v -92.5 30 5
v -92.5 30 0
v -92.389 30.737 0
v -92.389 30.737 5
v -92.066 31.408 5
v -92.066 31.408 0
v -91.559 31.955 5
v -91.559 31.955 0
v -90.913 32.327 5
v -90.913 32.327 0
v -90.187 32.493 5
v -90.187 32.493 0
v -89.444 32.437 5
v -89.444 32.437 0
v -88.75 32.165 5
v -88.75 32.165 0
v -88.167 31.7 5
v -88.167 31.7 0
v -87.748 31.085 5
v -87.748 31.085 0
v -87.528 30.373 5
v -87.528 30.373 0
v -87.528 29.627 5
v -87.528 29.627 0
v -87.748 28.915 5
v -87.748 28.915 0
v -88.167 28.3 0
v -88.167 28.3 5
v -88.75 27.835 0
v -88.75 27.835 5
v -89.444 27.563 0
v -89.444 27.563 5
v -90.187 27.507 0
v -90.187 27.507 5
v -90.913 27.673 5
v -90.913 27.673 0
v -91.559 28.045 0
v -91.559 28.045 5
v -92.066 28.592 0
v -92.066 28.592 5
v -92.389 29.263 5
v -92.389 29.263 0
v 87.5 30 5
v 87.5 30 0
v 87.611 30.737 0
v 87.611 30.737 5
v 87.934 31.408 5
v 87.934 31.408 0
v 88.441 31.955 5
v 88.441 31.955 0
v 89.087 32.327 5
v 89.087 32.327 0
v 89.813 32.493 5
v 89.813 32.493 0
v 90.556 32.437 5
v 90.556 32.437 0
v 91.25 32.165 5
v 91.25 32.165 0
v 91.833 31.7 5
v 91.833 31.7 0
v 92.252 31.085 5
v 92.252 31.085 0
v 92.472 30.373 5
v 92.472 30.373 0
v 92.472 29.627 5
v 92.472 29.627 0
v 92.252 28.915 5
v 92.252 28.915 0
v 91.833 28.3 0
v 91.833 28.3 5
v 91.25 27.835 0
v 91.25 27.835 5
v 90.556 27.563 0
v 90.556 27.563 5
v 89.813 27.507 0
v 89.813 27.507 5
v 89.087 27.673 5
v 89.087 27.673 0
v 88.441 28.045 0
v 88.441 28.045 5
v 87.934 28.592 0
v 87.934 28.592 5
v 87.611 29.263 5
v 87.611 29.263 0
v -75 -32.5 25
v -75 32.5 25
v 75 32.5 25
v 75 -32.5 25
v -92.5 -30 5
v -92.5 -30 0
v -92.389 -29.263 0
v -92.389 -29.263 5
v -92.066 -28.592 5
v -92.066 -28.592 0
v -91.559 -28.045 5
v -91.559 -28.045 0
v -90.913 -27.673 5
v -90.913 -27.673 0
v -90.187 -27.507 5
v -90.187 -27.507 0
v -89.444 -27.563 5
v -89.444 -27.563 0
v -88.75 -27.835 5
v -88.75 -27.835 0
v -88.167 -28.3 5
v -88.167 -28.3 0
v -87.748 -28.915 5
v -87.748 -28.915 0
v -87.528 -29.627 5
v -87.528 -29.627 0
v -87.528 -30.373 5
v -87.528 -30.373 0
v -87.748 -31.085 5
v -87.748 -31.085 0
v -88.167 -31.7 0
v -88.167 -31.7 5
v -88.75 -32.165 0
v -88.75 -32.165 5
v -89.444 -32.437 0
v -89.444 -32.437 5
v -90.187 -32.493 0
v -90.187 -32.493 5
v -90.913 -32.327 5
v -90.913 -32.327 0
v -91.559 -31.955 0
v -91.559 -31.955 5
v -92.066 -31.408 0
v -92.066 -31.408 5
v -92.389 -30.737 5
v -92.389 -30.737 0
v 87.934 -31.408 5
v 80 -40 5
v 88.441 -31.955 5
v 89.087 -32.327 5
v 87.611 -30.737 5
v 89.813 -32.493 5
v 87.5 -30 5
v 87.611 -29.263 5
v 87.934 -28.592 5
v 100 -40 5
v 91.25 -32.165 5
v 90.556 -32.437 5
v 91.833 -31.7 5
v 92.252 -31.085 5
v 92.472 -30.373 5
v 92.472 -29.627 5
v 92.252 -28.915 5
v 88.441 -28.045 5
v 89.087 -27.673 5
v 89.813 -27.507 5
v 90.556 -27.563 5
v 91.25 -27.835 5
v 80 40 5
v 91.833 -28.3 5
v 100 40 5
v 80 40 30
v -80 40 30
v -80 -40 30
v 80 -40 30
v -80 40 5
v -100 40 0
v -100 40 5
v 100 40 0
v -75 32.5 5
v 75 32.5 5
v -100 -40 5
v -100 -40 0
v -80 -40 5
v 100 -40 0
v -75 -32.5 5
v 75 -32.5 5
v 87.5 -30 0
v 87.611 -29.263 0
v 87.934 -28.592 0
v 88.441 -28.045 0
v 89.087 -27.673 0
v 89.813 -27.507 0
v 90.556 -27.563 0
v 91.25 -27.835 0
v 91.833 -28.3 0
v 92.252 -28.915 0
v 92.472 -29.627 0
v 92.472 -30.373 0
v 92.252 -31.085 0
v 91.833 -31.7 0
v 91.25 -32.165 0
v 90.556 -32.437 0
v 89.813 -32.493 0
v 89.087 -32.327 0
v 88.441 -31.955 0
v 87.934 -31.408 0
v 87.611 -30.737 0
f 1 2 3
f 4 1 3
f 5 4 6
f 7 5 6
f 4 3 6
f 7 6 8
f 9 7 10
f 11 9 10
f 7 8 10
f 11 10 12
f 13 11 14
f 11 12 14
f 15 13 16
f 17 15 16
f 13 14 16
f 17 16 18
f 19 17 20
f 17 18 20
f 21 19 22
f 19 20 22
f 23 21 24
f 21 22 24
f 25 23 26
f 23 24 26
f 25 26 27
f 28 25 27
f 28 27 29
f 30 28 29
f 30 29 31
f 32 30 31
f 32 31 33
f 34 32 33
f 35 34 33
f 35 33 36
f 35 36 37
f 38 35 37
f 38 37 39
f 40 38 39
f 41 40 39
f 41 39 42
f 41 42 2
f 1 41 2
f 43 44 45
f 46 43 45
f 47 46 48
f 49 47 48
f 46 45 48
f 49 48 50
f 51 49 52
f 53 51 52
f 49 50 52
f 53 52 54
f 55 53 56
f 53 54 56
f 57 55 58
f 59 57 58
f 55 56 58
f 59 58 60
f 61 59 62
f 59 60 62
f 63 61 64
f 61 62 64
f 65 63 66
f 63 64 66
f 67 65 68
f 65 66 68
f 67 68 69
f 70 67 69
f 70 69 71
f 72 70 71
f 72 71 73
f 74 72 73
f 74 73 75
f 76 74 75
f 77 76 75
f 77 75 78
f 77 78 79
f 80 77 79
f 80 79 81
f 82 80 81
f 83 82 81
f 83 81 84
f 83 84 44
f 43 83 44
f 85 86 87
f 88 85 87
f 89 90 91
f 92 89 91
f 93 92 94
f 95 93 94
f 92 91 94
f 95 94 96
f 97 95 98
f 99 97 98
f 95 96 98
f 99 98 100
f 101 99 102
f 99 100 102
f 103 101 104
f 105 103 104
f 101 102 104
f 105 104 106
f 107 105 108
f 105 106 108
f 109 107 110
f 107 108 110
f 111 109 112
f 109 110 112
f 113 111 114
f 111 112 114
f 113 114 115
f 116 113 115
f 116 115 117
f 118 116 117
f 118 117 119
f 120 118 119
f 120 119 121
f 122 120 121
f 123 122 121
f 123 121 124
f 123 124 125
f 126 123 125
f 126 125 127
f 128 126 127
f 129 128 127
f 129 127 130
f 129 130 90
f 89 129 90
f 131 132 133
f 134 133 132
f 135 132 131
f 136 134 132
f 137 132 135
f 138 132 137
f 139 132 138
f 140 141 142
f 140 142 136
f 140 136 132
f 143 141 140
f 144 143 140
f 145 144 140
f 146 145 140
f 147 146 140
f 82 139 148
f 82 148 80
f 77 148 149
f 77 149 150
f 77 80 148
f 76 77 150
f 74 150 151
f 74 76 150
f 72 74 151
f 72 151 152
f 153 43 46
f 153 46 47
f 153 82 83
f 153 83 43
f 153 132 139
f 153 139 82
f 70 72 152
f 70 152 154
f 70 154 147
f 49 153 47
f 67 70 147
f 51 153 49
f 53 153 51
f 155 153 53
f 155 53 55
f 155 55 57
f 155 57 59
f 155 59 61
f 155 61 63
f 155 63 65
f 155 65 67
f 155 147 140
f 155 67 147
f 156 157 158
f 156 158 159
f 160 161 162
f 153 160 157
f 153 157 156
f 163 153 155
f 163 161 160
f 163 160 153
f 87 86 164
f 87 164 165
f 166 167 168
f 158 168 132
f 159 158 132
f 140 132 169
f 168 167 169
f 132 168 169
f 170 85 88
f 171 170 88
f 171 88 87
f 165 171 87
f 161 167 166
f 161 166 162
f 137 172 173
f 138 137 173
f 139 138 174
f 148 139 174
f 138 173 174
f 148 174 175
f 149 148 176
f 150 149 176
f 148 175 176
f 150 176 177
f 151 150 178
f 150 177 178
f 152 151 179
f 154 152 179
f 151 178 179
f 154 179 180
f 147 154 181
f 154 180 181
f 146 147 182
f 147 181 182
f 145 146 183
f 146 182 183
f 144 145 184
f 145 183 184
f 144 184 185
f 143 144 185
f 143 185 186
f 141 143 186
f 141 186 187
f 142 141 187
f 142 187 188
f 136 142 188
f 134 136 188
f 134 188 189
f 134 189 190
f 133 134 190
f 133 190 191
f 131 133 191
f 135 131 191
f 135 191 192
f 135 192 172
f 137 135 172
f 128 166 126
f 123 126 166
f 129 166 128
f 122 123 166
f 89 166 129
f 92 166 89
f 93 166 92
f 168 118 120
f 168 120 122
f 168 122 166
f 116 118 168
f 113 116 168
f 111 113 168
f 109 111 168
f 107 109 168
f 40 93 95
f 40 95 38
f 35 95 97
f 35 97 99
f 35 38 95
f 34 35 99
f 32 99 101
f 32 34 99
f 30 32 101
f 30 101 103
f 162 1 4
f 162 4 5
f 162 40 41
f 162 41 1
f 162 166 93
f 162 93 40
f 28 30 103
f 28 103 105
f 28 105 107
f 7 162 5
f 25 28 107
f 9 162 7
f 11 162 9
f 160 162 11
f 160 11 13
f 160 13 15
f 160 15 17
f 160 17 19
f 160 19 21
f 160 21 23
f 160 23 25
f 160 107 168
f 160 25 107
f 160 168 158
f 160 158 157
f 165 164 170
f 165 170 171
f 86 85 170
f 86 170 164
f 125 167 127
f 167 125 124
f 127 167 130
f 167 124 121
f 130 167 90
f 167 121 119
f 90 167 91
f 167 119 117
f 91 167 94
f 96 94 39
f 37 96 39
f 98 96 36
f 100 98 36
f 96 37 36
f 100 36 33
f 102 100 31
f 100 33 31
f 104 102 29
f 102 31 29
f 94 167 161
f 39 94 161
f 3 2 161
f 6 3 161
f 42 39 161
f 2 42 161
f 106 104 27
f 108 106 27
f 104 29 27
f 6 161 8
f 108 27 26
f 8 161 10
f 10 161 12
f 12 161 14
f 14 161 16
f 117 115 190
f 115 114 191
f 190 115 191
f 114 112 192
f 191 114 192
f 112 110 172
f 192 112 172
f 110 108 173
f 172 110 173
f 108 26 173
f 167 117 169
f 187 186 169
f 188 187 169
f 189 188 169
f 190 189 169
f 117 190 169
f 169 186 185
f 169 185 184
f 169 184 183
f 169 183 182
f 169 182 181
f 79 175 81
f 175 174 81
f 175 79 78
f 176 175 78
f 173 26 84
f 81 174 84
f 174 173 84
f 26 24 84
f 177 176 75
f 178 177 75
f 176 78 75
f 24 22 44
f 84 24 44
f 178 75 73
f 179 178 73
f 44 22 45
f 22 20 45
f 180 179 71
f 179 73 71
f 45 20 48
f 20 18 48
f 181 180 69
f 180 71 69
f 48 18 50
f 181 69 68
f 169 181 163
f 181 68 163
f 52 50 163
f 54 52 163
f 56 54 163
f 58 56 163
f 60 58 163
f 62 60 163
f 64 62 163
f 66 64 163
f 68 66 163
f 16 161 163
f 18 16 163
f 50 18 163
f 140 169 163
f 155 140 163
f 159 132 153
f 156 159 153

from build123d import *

# Parameters (mm, degrees)
SKETCH_1_W             = 200
SKETCH_1_H             = 80
EXTRUDE_1_DEPTH        = 5
SKETCH_2_W             = 160
SKETCH_2_H             = 80
EXTRUDE_2_DEPTH        = 25
CUT_EXTRUDE_START      = -5
SKETCH_3_W             = 150
SKETCH_3_H             = 65
CUT_EXTRUDE_1_DEPTH    = 20
HOLE_WIZARD_M6_1_D     = 5
HOLE_WIZARD_M6_1_DEPTH = 15
HOLE_WIZARD_M6_1_TIP   = 1.502151548


with BuildPart() as part:
    # 草图1 → 凸台-拉伸1 (new body)
    with BuildSketch(Plane.XY):
        Rectangle(SKETCH_1_W, SKETCH_1_H)
    extrude(amount=EXTRUDE_1_DEPTH)

    # 草图2 → 凸台-拉伸2 (add)
    with BuildSketch(Plane.XY.offset(5)):
        Rectangle(SKETCH_2_W, SKETCH_2_H)
    extrude(amount=EXTRUDE_2_DEPTH)

    # 草图3 → 切除-拉伸1 (cut)
    with BuildSketch(Plane.XY.offset(30).offset(CUT_EXTRUDE_START)):
        Rectangle(SKETCH_3_W, SKETCH_3_H)
    extrude(amount=-CUT_EXTRUDE_1_DEPTH, mode=Mode.SUBTRACT)

    # M6 螺纹孔1
    with Locations(Plane.XY.offset(5)):
        with Locations((-90, 30), (-90, -30), (90, 30), (90, -30)):
            Hole(HOLE_WIZARD_M6_1_D / 2, depth=HOLE_WIZARD_M6_1_DEPTH)
            with Locations((0, 0, -(HOLE_WIZARD_M6_1_DEPTH + HOLE_WIZARD_M6_1_TIP / 2))):  # 118° drill point
                Cone(0, HOLE_WIZARD_M6_1_D / 2, HOLE_WIZARD_M6_1_TIP, mode=Mode.SUBTRACT)


solid = part.part
